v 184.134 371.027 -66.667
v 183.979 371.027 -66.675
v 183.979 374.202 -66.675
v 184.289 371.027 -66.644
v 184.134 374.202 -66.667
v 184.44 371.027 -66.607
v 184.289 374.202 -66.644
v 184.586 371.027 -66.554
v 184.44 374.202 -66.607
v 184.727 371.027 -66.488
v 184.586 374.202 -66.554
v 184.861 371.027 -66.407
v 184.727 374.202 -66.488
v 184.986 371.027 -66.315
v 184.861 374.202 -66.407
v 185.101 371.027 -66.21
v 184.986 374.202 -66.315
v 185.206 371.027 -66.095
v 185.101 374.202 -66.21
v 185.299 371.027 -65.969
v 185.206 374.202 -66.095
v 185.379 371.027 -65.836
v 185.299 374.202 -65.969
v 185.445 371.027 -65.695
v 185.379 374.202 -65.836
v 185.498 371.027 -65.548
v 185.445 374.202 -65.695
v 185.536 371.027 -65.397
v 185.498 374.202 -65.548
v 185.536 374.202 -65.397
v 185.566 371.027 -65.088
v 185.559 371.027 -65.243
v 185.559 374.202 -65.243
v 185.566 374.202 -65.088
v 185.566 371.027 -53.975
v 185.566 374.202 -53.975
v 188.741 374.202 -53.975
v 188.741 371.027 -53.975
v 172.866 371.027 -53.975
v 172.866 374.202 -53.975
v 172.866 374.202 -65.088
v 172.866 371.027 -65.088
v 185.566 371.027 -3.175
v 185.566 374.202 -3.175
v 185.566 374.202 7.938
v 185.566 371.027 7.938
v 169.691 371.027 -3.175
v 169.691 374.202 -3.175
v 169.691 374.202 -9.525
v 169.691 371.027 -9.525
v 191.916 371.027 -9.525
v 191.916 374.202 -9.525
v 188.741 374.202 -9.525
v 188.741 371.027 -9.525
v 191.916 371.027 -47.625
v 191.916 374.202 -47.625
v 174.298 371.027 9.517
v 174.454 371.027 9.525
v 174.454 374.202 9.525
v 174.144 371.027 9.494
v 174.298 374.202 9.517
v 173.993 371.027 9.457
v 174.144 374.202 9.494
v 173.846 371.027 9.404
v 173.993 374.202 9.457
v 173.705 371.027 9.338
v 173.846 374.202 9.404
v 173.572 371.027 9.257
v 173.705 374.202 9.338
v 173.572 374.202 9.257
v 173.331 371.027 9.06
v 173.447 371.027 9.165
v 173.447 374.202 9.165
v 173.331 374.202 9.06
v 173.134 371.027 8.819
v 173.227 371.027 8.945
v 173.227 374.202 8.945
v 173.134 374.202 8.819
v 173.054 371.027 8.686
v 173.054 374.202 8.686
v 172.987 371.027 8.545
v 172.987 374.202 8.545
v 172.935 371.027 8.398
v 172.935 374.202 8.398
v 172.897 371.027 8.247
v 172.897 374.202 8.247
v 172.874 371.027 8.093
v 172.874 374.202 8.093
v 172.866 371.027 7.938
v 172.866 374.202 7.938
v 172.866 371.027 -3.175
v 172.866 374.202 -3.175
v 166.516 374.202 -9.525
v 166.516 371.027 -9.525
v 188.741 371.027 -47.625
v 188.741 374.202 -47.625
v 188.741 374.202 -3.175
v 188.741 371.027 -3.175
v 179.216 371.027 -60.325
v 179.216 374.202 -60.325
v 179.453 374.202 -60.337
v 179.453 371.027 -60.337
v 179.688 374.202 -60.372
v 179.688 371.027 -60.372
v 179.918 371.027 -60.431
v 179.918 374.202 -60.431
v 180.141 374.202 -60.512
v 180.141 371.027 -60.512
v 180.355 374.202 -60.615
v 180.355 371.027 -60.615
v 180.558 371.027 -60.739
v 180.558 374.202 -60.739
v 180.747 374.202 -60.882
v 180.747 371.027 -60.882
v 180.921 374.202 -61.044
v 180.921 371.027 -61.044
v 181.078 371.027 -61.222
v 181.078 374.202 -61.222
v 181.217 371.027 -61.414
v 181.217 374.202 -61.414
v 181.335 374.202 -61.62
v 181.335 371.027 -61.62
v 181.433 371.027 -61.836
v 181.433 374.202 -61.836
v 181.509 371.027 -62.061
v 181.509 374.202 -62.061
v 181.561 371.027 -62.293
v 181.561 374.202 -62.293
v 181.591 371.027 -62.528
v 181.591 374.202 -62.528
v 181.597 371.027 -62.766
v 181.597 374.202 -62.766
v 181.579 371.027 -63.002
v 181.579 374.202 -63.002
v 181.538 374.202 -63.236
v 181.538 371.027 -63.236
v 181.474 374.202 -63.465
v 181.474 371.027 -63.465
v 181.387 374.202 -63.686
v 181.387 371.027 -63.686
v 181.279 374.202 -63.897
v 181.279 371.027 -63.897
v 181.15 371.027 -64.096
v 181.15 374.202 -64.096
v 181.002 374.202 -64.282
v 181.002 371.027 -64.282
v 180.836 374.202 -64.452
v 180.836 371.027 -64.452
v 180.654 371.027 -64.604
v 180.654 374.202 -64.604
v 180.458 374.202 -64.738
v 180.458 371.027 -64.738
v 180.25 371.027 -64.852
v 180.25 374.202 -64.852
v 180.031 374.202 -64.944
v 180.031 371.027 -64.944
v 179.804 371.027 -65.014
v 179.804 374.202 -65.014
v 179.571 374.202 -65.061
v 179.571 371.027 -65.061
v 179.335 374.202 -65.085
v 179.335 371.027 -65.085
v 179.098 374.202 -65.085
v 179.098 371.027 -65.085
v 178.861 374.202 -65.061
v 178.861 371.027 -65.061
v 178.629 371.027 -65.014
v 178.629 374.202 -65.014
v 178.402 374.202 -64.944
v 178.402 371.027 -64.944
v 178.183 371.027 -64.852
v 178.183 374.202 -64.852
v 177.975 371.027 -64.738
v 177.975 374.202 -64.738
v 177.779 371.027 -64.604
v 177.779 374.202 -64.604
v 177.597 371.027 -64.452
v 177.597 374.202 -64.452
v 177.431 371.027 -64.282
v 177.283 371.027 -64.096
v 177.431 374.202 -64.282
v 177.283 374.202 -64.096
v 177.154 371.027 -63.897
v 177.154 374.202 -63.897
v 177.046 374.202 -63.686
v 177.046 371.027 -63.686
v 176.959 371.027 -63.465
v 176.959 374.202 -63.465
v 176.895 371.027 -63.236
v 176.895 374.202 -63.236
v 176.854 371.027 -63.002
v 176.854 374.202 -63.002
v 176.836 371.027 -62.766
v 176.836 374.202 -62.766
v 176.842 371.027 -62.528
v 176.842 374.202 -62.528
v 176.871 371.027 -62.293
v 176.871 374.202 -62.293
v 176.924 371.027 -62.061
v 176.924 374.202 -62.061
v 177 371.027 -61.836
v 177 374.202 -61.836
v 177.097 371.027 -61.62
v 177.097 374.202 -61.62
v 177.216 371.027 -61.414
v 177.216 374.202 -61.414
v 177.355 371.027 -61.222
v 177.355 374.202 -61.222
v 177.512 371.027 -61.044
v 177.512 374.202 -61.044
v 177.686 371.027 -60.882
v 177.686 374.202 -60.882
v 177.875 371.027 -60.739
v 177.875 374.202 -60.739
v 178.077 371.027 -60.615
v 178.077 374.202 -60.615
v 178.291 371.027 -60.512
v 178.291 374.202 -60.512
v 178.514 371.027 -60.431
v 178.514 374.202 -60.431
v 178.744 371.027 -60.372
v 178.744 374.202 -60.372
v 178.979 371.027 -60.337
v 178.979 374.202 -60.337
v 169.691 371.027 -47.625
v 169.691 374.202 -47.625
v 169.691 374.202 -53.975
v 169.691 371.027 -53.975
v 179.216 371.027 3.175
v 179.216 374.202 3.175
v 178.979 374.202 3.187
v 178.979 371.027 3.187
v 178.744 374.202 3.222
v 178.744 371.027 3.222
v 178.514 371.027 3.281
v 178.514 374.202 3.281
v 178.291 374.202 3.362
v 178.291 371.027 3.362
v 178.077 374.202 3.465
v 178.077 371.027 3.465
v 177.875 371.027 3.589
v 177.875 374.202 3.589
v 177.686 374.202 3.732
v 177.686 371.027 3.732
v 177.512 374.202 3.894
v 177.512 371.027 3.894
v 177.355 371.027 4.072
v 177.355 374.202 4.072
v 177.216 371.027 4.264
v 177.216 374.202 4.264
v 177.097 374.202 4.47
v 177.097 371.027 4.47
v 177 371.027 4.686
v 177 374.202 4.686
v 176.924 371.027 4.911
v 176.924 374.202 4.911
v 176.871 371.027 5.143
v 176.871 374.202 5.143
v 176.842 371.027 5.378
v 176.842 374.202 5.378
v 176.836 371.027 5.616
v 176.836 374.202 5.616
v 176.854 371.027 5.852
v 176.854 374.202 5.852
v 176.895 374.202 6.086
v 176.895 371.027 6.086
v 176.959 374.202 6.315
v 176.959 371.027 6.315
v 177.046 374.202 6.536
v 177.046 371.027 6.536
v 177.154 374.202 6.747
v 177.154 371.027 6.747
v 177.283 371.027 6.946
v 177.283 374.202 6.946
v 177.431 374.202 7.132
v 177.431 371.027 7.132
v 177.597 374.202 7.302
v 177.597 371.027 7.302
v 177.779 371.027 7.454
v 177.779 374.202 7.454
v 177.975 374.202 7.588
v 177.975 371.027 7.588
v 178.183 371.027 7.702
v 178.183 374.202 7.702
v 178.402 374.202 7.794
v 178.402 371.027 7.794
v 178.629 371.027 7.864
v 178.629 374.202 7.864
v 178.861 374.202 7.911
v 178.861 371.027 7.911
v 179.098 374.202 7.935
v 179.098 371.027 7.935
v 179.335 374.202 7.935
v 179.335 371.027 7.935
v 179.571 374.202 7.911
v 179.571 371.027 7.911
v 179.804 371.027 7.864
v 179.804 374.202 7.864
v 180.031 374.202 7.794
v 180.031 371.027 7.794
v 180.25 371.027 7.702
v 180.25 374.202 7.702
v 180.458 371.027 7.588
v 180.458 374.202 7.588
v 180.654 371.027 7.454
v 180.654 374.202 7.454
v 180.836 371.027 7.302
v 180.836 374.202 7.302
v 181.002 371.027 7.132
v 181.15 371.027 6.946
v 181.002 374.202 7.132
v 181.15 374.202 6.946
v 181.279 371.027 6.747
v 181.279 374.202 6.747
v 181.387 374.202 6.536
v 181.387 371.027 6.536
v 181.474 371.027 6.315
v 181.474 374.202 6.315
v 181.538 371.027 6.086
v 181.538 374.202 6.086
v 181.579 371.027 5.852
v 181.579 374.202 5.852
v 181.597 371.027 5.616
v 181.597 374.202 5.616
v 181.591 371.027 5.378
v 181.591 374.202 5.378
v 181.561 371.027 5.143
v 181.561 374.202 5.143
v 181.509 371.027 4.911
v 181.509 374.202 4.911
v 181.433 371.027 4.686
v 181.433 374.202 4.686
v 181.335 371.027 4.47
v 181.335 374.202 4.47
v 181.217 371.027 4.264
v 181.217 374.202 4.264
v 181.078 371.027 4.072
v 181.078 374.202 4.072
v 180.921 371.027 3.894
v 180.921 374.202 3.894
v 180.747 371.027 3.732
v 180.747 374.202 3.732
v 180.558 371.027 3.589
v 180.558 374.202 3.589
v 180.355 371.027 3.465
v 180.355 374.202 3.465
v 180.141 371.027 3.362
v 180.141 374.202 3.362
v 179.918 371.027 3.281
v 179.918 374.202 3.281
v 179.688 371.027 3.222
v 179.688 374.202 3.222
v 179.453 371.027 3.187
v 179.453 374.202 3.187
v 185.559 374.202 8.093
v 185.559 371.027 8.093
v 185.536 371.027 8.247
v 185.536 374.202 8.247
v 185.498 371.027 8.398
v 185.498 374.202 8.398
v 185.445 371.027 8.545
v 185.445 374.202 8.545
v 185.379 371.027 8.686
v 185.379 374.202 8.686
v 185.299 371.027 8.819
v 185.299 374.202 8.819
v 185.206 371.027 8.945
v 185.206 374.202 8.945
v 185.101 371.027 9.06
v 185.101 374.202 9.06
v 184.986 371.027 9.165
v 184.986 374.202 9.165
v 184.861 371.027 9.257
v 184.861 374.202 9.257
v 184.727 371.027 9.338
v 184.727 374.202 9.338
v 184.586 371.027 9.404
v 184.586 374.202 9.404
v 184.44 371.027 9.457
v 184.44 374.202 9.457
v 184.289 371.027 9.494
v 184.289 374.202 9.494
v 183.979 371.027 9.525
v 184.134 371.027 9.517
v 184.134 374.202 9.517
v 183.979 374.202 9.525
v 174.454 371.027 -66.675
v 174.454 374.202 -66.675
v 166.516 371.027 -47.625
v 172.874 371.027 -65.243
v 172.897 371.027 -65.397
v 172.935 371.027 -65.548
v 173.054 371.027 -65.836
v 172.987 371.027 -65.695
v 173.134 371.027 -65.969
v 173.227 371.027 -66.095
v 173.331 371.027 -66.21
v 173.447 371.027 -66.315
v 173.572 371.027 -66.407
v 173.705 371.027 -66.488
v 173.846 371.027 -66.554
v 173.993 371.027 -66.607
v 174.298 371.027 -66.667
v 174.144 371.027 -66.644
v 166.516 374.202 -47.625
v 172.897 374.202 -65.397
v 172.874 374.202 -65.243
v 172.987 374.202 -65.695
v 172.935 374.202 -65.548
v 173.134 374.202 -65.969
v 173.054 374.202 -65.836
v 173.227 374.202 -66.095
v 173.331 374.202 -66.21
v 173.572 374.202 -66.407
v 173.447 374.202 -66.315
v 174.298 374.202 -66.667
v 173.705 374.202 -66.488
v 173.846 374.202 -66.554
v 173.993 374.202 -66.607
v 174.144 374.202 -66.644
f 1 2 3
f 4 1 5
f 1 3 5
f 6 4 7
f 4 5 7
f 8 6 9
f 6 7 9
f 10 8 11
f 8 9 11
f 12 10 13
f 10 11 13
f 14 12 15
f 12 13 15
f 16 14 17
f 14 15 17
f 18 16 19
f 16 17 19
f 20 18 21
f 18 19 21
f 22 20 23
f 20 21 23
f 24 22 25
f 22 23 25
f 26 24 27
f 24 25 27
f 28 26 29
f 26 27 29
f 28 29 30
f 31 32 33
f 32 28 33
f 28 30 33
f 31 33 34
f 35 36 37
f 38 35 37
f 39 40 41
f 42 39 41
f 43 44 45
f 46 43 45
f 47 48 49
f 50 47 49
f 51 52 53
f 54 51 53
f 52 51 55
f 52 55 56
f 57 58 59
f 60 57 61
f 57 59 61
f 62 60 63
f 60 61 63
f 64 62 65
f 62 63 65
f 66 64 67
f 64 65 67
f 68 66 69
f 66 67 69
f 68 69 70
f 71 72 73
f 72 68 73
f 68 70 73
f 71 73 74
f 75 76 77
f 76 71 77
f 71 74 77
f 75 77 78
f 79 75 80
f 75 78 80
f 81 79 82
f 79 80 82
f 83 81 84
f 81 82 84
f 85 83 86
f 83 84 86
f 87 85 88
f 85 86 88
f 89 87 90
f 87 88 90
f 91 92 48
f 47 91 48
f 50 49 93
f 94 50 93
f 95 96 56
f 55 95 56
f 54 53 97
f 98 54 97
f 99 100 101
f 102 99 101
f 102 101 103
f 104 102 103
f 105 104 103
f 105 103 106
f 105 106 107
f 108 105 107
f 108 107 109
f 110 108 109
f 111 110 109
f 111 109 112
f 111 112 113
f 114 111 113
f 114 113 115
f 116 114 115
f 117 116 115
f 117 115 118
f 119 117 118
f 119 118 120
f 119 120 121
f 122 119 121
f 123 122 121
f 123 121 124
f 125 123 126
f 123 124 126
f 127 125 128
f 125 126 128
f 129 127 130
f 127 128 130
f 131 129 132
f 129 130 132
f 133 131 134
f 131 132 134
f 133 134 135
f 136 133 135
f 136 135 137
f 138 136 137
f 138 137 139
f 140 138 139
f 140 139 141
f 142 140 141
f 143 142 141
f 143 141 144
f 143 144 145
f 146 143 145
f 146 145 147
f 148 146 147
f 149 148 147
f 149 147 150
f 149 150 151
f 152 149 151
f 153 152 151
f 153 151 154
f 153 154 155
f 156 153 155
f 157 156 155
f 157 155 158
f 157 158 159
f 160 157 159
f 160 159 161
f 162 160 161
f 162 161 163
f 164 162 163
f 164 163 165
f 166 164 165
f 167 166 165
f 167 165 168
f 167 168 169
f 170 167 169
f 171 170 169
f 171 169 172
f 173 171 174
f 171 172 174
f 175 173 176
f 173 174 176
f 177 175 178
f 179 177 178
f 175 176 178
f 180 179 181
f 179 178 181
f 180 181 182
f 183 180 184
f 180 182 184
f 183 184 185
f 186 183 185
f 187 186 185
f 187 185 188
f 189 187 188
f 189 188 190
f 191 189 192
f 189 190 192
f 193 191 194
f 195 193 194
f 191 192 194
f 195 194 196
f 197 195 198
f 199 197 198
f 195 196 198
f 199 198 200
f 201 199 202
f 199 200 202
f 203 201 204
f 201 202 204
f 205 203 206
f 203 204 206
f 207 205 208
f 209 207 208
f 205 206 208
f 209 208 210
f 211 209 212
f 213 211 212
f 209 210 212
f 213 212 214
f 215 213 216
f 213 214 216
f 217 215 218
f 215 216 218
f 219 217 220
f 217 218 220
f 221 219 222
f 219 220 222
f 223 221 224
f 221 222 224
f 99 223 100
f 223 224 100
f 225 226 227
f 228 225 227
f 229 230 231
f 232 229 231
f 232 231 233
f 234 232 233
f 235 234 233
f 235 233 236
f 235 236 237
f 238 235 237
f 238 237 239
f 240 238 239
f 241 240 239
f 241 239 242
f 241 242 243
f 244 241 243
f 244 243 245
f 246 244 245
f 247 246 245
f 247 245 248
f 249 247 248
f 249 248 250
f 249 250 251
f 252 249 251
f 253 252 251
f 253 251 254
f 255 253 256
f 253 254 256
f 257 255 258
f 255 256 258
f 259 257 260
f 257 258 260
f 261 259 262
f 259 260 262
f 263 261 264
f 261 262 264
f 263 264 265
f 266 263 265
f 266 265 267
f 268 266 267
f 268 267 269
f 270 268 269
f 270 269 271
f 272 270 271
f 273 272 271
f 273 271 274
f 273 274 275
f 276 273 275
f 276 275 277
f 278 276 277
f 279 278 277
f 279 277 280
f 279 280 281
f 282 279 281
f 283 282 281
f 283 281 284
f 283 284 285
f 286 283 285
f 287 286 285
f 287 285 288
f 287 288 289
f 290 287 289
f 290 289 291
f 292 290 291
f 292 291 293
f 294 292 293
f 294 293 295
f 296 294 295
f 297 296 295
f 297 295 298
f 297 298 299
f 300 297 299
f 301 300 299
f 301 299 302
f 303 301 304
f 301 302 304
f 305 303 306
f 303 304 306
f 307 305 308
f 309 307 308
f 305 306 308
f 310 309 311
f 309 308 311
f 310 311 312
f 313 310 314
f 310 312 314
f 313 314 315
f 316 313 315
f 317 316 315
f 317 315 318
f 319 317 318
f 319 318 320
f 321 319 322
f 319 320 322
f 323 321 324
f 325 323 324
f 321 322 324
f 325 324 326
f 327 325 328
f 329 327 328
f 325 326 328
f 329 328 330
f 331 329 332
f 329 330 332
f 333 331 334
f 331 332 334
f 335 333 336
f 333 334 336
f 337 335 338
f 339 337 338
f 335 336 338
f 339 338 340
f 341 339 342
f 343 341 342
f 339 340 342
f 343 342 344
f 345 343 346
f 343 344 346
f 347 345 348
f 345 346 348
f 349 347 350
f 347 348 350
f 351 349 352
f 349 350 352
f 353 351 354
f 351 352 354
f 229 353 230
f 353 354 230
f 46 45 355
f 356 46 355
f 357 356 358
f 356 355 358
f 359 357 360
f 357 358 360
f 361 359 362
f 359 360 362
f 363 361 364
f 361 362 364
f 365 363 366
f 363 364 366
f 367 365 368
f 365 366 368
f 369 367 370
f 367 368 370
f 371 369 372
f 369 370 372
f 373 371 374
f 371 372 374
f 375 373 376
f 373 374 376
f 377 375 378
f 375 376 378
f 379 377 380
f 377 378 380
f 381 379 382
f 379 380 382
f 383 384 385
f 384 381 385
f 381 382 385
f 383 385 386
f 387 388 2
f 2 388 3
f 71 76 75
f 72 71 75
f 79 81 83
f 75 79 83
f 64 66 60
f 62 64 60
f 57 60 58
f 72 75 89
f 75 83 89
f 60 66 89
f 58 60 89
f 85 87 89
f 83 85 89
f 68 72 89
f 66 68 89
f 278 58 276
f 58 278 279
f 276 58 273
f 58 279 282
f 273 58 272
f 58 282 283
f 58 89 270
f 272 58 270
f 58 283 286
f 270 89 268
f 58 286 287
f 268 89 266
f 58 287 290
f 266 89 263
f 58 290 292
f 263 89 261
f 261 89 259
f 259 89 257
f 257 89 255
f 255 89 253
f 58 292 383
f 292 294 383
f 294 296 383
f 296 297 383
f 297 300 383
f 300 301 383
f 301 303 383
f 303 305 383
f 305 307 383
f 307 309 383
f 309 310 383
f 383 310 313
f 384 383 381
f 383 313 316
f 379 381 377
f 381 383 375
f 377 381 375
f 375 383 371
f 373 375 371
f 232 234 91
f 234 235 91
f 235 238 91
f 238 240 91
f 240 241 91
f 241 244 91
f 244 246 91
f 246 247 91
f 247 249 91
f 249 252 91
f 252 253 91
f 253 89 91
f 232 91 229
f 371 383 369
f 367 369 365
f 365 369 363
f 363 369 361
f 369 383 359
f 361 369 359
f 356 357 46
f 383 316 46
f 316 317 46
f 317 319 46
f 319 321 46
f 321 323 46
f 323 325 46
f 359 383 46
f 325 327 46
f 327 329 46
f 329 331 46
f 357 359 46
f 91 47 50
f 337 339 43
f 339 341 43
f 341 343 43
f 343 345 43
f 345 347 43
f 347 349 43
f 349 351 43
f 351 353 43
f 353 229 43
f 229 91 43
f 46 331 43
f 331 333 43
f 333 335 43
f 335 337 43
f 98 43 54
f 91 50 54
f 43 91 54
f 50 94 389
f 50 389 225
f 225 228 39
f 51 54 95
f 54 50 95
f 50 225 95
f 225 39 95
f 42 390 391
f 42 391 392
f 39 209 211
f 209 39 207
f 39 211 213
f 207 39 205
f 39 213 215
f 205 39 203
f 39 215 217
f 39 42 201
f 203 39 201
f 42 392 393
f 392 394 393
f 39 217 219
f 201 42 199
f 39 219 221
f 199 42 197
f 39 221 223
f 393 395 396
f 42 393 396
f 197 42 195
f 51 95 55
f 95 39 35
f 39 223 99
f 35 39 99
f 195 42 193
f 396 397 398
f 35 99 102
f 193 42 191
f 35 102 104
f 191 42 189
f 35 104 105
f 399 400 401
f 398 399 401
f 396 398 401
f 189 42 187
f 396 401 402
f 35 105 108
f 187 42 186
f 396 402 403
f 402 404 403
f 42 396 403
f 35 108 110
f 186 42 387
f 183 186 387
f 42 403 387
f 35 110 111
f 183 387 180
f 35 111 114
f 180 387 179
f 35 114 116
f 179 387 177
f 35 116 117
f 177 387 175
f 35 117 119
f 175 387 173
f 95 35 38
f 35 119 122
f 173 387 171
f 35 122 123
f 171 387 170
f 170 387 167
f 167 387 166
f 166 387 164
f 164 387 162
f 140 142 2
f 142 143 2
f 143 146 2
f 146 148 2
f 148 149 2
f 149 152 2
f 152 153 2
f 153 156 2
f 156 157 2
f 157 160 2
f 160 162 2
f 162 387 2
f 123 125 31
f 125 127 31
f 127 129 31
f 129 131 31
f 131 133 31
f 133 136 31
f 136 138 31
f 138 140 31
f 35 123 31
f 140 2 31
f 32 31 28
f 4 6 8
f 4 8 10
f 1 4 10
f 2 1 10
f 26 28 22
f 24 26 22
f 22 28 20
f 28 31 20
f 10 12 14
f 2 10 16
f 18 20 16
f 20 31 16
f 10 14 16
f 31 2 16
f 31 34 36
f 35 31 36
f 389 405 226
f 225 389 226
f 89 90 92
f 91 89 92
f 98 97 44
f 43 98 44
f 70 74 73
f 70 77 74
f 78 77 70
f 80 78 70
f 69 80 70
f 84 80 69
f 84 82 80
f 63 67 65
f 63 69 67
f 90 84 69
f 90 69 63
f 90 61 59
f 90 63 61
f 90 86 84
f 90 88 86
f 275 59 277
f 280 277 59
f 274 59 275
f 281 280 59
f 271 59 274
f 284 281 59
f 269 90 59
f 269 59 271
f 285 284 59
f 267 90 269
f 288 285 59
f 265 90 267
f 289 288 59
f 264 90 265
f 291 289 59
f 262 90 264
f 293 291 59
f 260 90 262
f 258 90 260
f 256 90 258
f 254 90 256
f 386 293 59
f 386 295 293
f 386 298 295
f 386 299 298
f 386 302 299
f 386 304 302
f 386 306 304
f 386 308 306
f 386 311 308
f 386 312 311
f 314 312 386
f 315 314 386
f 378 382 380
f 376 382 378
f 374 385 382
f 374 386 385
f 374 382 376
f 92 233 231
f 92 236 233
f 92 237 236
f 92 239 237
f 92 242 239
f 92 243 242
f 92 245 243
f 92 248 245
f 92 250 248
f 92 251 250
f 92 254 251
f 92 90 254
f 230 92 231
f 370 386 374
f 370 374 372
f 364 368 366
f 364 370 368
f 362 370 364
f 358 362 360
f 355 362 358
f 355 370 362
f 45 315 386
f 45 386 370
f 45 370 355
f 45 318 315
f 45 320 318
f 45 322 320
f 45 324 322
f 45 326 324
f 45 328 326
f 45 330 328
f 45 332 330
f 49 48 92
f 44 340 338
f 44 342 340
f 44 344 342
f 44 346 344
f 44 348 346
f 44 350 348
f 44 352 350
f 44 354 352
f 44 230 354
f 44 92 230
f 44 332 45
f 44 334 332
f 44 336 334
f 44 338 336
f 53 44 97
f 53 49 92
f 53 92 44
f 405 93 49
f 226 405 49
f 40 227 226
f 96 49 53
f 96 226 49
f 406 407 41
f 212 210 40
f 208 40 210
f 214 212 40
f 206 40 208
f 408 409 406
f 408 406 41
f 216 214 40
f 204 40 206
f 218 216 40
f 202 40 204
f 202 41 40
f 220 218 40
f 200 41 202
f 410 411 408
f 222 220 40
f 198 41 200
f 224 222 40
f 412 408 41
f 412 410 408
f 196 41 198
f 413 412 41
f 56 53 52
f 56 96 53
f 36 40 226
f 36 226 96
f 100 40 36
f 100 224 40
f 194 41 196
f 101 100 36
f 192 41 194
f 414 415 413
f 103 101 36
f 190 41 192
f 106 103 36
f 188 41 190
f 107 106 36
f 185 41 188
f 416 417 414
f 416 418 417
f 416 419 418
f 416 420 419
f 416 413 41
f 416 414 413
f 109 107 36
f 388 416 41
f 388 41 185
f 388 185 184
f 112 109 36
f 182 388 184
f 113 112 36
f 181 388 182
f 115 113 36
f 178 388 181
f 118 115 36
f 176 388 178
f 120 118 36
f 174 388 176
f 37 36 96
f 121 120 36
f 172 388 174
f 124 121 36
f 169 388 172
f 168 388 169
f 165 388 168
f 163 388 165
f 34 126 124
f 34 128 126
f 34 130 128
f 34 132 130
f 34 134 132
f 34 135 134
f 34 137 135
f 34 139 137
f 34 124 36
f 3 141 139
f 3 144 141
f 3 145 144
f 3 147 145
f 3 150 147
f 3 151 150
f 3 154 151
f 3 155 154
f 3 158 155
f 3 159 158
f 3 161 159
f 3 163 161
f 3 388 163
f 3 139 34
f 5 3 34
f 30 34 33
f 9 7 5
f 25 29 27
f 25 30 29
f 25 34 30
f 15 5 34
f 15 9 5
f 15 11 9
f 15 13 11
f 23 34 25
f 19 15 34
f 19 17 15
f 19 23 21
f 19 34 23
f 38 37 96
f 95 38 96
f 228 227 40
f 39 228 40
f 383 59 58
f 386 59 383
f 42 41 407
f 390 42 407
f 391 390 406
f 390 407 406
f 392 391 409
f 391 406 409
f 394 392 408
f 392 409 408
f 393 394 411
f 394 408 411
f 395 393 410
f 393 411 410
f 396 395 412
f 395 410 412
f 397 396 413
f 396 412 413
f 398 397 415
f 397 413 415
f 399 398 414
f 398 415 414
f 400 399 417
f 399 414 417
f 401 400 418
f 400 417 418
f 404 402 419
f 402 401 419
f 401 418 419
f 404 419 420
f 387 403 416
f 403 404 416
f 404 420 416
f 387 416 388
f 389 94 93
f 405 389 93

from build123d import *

# Parameters (mm, degrees)
BOSS_EXTRUDE1_DEPTH      = 9.525
BOSS_EXTRUDE1_DEPTH_BACK = 66.675
SKETCH1_W                = 25.4
SKETCH1_H                = 3.175
SKETCH2_W                = 25.4
SKETCH2_H                = 5.678954819
SKETCH2_R                = 2.38125
CUT_EXTRUDE1_DEPTH       = 204.193280927


with BuildPart() as part:
    # Sketch1 → Boss-Extrude1 (new, two sides: drawn at the far end of the back side and taken through both)
    with BuildSketch(Plane.XY.offset(-BOSS_EXTRUDE1_DEPTH_BACK)):
        with Locations((179.216318128, 372.614308443)):
            Rectangle(SKETCH1_W, SKETCH1_H)
    extrude(amount=BOSS_EXTRUDE1_DEPTH + BOSS_EXTRUDE1_DEPTH_BACK)

    # Sketch2 → Cut-Extrude1 (cut, through all)
    with BuildSketch(Plane(origin=(0, 374.201808443, 0), x_dir=(1, 0, 0), z_dir=(0, 1, 0))):
        with BuildLine():
            Line((166.516318128, 57.15), (166.516318128, 47.625))
            Line((166.516318128, 47.625), (169.691318128, 47.625))
            Line((169.691318128, 47.625), (169.691318128, 53.975))
            Line((169.691318128, 53.975), (172.866318128, 53.975))
            Line((172.866318128, 53.975), (172.866318128, 65.0875))
            ThreePointArc((172.866318128, 65.0875), (173.331286113, 66.210032015), (174.453818128, 66.675))
            Line((174.453818128, 66.675), (166.516318128, 66.675))
            Line((166.516318128, 66.675), (166.516318128, 57.15))
        make_face()
        with Locations((179.216318128, 69.51447741)):
            Rectangle(SKETCH2_W, SKETCH2_H)
        with BuildLine():
            Line((188.741318128, 47.625), (191.916318128, 47.625))
            Line((191.916318128, 47.625), (191.916318128, 53.975))
            Line((191.916318128, 53.975), (191.916318128, 66.675))
            Line((191.916318128, 66.675), (183.978818128, 66.675))
            ThreePointArc((183.978818128, 66.675), (185.101350143, 66.210032015), (185.566318128, 65.0875))
            Line((185.566318128, 65.0875), (185.566318128, 53.975))
            Line((185.566318128, 53.975), (188.741318128, 53.975))
            Line((188.741318128, 53.975), (188.741318128, 47.625))
        make_face()
        with Locations(Location((179.216318128, 62.70625, 0), (0, 0, 270))):
            Circle(SKETCH2_R)
        with BuildLine():
            Line((169.691318128, 9.525), (166.516318128, 9.525))
            Line((166.516318128, 9.525), (166.516318128, 0))
            Line((166.516318128, 0), (166.516318128, -9.525))
            Line((166.516318128, -9.525), (174.453818128, -9.525))
            ThreePointArc((174.453818128, -9.525), (173.331286113, -9.060032015), (172.866318128, -7.9375))
            Line((172.866318128, -7.9375), (172.866318128, 3.175))
            Line((172.866318128, 3.175), (169.691318128, 3.175))
            Line((169.691318128, 3.175), (169.691318128, 9.525))
        make_face()
        with Locations((179.216318128, -12.36447741)):
            Rectangle(SKETCH2_W, SKETCH2_H)
        with BuildLine():
            Line((191.916318128, 3.175), (191.916318128, 9.525))
            Line((191.916318128, 9.525), (188.741318128, 9.525))
            Line((188.741318128, 9.525), (188.741318128, 3.175))
            Line((188.741318128, 3.175), (185.566318128, 3.175))
            Line((185.566318128, 3.175), (185.566318128, -7.9375))
            ThreePointArc((185.566318128, -7.9375), (185.101350143, -9.060032015), (183.978818128, -9.525))
            Line((183.978818128, -9.525), (191.916318128, -9.525))
            Line((191.916318128, -9.525), (191.916318128, 3.175))
        make_face()
        with Locations(Location((179.216318128, -5.55625, 0), (0, 0, 90))):
            Circle(SKETCH2_R)
    extrude(amount=-CUT_EXTRUDE1_DEPTH, mode=Mode.SUBTRACT)


solid = part.part
